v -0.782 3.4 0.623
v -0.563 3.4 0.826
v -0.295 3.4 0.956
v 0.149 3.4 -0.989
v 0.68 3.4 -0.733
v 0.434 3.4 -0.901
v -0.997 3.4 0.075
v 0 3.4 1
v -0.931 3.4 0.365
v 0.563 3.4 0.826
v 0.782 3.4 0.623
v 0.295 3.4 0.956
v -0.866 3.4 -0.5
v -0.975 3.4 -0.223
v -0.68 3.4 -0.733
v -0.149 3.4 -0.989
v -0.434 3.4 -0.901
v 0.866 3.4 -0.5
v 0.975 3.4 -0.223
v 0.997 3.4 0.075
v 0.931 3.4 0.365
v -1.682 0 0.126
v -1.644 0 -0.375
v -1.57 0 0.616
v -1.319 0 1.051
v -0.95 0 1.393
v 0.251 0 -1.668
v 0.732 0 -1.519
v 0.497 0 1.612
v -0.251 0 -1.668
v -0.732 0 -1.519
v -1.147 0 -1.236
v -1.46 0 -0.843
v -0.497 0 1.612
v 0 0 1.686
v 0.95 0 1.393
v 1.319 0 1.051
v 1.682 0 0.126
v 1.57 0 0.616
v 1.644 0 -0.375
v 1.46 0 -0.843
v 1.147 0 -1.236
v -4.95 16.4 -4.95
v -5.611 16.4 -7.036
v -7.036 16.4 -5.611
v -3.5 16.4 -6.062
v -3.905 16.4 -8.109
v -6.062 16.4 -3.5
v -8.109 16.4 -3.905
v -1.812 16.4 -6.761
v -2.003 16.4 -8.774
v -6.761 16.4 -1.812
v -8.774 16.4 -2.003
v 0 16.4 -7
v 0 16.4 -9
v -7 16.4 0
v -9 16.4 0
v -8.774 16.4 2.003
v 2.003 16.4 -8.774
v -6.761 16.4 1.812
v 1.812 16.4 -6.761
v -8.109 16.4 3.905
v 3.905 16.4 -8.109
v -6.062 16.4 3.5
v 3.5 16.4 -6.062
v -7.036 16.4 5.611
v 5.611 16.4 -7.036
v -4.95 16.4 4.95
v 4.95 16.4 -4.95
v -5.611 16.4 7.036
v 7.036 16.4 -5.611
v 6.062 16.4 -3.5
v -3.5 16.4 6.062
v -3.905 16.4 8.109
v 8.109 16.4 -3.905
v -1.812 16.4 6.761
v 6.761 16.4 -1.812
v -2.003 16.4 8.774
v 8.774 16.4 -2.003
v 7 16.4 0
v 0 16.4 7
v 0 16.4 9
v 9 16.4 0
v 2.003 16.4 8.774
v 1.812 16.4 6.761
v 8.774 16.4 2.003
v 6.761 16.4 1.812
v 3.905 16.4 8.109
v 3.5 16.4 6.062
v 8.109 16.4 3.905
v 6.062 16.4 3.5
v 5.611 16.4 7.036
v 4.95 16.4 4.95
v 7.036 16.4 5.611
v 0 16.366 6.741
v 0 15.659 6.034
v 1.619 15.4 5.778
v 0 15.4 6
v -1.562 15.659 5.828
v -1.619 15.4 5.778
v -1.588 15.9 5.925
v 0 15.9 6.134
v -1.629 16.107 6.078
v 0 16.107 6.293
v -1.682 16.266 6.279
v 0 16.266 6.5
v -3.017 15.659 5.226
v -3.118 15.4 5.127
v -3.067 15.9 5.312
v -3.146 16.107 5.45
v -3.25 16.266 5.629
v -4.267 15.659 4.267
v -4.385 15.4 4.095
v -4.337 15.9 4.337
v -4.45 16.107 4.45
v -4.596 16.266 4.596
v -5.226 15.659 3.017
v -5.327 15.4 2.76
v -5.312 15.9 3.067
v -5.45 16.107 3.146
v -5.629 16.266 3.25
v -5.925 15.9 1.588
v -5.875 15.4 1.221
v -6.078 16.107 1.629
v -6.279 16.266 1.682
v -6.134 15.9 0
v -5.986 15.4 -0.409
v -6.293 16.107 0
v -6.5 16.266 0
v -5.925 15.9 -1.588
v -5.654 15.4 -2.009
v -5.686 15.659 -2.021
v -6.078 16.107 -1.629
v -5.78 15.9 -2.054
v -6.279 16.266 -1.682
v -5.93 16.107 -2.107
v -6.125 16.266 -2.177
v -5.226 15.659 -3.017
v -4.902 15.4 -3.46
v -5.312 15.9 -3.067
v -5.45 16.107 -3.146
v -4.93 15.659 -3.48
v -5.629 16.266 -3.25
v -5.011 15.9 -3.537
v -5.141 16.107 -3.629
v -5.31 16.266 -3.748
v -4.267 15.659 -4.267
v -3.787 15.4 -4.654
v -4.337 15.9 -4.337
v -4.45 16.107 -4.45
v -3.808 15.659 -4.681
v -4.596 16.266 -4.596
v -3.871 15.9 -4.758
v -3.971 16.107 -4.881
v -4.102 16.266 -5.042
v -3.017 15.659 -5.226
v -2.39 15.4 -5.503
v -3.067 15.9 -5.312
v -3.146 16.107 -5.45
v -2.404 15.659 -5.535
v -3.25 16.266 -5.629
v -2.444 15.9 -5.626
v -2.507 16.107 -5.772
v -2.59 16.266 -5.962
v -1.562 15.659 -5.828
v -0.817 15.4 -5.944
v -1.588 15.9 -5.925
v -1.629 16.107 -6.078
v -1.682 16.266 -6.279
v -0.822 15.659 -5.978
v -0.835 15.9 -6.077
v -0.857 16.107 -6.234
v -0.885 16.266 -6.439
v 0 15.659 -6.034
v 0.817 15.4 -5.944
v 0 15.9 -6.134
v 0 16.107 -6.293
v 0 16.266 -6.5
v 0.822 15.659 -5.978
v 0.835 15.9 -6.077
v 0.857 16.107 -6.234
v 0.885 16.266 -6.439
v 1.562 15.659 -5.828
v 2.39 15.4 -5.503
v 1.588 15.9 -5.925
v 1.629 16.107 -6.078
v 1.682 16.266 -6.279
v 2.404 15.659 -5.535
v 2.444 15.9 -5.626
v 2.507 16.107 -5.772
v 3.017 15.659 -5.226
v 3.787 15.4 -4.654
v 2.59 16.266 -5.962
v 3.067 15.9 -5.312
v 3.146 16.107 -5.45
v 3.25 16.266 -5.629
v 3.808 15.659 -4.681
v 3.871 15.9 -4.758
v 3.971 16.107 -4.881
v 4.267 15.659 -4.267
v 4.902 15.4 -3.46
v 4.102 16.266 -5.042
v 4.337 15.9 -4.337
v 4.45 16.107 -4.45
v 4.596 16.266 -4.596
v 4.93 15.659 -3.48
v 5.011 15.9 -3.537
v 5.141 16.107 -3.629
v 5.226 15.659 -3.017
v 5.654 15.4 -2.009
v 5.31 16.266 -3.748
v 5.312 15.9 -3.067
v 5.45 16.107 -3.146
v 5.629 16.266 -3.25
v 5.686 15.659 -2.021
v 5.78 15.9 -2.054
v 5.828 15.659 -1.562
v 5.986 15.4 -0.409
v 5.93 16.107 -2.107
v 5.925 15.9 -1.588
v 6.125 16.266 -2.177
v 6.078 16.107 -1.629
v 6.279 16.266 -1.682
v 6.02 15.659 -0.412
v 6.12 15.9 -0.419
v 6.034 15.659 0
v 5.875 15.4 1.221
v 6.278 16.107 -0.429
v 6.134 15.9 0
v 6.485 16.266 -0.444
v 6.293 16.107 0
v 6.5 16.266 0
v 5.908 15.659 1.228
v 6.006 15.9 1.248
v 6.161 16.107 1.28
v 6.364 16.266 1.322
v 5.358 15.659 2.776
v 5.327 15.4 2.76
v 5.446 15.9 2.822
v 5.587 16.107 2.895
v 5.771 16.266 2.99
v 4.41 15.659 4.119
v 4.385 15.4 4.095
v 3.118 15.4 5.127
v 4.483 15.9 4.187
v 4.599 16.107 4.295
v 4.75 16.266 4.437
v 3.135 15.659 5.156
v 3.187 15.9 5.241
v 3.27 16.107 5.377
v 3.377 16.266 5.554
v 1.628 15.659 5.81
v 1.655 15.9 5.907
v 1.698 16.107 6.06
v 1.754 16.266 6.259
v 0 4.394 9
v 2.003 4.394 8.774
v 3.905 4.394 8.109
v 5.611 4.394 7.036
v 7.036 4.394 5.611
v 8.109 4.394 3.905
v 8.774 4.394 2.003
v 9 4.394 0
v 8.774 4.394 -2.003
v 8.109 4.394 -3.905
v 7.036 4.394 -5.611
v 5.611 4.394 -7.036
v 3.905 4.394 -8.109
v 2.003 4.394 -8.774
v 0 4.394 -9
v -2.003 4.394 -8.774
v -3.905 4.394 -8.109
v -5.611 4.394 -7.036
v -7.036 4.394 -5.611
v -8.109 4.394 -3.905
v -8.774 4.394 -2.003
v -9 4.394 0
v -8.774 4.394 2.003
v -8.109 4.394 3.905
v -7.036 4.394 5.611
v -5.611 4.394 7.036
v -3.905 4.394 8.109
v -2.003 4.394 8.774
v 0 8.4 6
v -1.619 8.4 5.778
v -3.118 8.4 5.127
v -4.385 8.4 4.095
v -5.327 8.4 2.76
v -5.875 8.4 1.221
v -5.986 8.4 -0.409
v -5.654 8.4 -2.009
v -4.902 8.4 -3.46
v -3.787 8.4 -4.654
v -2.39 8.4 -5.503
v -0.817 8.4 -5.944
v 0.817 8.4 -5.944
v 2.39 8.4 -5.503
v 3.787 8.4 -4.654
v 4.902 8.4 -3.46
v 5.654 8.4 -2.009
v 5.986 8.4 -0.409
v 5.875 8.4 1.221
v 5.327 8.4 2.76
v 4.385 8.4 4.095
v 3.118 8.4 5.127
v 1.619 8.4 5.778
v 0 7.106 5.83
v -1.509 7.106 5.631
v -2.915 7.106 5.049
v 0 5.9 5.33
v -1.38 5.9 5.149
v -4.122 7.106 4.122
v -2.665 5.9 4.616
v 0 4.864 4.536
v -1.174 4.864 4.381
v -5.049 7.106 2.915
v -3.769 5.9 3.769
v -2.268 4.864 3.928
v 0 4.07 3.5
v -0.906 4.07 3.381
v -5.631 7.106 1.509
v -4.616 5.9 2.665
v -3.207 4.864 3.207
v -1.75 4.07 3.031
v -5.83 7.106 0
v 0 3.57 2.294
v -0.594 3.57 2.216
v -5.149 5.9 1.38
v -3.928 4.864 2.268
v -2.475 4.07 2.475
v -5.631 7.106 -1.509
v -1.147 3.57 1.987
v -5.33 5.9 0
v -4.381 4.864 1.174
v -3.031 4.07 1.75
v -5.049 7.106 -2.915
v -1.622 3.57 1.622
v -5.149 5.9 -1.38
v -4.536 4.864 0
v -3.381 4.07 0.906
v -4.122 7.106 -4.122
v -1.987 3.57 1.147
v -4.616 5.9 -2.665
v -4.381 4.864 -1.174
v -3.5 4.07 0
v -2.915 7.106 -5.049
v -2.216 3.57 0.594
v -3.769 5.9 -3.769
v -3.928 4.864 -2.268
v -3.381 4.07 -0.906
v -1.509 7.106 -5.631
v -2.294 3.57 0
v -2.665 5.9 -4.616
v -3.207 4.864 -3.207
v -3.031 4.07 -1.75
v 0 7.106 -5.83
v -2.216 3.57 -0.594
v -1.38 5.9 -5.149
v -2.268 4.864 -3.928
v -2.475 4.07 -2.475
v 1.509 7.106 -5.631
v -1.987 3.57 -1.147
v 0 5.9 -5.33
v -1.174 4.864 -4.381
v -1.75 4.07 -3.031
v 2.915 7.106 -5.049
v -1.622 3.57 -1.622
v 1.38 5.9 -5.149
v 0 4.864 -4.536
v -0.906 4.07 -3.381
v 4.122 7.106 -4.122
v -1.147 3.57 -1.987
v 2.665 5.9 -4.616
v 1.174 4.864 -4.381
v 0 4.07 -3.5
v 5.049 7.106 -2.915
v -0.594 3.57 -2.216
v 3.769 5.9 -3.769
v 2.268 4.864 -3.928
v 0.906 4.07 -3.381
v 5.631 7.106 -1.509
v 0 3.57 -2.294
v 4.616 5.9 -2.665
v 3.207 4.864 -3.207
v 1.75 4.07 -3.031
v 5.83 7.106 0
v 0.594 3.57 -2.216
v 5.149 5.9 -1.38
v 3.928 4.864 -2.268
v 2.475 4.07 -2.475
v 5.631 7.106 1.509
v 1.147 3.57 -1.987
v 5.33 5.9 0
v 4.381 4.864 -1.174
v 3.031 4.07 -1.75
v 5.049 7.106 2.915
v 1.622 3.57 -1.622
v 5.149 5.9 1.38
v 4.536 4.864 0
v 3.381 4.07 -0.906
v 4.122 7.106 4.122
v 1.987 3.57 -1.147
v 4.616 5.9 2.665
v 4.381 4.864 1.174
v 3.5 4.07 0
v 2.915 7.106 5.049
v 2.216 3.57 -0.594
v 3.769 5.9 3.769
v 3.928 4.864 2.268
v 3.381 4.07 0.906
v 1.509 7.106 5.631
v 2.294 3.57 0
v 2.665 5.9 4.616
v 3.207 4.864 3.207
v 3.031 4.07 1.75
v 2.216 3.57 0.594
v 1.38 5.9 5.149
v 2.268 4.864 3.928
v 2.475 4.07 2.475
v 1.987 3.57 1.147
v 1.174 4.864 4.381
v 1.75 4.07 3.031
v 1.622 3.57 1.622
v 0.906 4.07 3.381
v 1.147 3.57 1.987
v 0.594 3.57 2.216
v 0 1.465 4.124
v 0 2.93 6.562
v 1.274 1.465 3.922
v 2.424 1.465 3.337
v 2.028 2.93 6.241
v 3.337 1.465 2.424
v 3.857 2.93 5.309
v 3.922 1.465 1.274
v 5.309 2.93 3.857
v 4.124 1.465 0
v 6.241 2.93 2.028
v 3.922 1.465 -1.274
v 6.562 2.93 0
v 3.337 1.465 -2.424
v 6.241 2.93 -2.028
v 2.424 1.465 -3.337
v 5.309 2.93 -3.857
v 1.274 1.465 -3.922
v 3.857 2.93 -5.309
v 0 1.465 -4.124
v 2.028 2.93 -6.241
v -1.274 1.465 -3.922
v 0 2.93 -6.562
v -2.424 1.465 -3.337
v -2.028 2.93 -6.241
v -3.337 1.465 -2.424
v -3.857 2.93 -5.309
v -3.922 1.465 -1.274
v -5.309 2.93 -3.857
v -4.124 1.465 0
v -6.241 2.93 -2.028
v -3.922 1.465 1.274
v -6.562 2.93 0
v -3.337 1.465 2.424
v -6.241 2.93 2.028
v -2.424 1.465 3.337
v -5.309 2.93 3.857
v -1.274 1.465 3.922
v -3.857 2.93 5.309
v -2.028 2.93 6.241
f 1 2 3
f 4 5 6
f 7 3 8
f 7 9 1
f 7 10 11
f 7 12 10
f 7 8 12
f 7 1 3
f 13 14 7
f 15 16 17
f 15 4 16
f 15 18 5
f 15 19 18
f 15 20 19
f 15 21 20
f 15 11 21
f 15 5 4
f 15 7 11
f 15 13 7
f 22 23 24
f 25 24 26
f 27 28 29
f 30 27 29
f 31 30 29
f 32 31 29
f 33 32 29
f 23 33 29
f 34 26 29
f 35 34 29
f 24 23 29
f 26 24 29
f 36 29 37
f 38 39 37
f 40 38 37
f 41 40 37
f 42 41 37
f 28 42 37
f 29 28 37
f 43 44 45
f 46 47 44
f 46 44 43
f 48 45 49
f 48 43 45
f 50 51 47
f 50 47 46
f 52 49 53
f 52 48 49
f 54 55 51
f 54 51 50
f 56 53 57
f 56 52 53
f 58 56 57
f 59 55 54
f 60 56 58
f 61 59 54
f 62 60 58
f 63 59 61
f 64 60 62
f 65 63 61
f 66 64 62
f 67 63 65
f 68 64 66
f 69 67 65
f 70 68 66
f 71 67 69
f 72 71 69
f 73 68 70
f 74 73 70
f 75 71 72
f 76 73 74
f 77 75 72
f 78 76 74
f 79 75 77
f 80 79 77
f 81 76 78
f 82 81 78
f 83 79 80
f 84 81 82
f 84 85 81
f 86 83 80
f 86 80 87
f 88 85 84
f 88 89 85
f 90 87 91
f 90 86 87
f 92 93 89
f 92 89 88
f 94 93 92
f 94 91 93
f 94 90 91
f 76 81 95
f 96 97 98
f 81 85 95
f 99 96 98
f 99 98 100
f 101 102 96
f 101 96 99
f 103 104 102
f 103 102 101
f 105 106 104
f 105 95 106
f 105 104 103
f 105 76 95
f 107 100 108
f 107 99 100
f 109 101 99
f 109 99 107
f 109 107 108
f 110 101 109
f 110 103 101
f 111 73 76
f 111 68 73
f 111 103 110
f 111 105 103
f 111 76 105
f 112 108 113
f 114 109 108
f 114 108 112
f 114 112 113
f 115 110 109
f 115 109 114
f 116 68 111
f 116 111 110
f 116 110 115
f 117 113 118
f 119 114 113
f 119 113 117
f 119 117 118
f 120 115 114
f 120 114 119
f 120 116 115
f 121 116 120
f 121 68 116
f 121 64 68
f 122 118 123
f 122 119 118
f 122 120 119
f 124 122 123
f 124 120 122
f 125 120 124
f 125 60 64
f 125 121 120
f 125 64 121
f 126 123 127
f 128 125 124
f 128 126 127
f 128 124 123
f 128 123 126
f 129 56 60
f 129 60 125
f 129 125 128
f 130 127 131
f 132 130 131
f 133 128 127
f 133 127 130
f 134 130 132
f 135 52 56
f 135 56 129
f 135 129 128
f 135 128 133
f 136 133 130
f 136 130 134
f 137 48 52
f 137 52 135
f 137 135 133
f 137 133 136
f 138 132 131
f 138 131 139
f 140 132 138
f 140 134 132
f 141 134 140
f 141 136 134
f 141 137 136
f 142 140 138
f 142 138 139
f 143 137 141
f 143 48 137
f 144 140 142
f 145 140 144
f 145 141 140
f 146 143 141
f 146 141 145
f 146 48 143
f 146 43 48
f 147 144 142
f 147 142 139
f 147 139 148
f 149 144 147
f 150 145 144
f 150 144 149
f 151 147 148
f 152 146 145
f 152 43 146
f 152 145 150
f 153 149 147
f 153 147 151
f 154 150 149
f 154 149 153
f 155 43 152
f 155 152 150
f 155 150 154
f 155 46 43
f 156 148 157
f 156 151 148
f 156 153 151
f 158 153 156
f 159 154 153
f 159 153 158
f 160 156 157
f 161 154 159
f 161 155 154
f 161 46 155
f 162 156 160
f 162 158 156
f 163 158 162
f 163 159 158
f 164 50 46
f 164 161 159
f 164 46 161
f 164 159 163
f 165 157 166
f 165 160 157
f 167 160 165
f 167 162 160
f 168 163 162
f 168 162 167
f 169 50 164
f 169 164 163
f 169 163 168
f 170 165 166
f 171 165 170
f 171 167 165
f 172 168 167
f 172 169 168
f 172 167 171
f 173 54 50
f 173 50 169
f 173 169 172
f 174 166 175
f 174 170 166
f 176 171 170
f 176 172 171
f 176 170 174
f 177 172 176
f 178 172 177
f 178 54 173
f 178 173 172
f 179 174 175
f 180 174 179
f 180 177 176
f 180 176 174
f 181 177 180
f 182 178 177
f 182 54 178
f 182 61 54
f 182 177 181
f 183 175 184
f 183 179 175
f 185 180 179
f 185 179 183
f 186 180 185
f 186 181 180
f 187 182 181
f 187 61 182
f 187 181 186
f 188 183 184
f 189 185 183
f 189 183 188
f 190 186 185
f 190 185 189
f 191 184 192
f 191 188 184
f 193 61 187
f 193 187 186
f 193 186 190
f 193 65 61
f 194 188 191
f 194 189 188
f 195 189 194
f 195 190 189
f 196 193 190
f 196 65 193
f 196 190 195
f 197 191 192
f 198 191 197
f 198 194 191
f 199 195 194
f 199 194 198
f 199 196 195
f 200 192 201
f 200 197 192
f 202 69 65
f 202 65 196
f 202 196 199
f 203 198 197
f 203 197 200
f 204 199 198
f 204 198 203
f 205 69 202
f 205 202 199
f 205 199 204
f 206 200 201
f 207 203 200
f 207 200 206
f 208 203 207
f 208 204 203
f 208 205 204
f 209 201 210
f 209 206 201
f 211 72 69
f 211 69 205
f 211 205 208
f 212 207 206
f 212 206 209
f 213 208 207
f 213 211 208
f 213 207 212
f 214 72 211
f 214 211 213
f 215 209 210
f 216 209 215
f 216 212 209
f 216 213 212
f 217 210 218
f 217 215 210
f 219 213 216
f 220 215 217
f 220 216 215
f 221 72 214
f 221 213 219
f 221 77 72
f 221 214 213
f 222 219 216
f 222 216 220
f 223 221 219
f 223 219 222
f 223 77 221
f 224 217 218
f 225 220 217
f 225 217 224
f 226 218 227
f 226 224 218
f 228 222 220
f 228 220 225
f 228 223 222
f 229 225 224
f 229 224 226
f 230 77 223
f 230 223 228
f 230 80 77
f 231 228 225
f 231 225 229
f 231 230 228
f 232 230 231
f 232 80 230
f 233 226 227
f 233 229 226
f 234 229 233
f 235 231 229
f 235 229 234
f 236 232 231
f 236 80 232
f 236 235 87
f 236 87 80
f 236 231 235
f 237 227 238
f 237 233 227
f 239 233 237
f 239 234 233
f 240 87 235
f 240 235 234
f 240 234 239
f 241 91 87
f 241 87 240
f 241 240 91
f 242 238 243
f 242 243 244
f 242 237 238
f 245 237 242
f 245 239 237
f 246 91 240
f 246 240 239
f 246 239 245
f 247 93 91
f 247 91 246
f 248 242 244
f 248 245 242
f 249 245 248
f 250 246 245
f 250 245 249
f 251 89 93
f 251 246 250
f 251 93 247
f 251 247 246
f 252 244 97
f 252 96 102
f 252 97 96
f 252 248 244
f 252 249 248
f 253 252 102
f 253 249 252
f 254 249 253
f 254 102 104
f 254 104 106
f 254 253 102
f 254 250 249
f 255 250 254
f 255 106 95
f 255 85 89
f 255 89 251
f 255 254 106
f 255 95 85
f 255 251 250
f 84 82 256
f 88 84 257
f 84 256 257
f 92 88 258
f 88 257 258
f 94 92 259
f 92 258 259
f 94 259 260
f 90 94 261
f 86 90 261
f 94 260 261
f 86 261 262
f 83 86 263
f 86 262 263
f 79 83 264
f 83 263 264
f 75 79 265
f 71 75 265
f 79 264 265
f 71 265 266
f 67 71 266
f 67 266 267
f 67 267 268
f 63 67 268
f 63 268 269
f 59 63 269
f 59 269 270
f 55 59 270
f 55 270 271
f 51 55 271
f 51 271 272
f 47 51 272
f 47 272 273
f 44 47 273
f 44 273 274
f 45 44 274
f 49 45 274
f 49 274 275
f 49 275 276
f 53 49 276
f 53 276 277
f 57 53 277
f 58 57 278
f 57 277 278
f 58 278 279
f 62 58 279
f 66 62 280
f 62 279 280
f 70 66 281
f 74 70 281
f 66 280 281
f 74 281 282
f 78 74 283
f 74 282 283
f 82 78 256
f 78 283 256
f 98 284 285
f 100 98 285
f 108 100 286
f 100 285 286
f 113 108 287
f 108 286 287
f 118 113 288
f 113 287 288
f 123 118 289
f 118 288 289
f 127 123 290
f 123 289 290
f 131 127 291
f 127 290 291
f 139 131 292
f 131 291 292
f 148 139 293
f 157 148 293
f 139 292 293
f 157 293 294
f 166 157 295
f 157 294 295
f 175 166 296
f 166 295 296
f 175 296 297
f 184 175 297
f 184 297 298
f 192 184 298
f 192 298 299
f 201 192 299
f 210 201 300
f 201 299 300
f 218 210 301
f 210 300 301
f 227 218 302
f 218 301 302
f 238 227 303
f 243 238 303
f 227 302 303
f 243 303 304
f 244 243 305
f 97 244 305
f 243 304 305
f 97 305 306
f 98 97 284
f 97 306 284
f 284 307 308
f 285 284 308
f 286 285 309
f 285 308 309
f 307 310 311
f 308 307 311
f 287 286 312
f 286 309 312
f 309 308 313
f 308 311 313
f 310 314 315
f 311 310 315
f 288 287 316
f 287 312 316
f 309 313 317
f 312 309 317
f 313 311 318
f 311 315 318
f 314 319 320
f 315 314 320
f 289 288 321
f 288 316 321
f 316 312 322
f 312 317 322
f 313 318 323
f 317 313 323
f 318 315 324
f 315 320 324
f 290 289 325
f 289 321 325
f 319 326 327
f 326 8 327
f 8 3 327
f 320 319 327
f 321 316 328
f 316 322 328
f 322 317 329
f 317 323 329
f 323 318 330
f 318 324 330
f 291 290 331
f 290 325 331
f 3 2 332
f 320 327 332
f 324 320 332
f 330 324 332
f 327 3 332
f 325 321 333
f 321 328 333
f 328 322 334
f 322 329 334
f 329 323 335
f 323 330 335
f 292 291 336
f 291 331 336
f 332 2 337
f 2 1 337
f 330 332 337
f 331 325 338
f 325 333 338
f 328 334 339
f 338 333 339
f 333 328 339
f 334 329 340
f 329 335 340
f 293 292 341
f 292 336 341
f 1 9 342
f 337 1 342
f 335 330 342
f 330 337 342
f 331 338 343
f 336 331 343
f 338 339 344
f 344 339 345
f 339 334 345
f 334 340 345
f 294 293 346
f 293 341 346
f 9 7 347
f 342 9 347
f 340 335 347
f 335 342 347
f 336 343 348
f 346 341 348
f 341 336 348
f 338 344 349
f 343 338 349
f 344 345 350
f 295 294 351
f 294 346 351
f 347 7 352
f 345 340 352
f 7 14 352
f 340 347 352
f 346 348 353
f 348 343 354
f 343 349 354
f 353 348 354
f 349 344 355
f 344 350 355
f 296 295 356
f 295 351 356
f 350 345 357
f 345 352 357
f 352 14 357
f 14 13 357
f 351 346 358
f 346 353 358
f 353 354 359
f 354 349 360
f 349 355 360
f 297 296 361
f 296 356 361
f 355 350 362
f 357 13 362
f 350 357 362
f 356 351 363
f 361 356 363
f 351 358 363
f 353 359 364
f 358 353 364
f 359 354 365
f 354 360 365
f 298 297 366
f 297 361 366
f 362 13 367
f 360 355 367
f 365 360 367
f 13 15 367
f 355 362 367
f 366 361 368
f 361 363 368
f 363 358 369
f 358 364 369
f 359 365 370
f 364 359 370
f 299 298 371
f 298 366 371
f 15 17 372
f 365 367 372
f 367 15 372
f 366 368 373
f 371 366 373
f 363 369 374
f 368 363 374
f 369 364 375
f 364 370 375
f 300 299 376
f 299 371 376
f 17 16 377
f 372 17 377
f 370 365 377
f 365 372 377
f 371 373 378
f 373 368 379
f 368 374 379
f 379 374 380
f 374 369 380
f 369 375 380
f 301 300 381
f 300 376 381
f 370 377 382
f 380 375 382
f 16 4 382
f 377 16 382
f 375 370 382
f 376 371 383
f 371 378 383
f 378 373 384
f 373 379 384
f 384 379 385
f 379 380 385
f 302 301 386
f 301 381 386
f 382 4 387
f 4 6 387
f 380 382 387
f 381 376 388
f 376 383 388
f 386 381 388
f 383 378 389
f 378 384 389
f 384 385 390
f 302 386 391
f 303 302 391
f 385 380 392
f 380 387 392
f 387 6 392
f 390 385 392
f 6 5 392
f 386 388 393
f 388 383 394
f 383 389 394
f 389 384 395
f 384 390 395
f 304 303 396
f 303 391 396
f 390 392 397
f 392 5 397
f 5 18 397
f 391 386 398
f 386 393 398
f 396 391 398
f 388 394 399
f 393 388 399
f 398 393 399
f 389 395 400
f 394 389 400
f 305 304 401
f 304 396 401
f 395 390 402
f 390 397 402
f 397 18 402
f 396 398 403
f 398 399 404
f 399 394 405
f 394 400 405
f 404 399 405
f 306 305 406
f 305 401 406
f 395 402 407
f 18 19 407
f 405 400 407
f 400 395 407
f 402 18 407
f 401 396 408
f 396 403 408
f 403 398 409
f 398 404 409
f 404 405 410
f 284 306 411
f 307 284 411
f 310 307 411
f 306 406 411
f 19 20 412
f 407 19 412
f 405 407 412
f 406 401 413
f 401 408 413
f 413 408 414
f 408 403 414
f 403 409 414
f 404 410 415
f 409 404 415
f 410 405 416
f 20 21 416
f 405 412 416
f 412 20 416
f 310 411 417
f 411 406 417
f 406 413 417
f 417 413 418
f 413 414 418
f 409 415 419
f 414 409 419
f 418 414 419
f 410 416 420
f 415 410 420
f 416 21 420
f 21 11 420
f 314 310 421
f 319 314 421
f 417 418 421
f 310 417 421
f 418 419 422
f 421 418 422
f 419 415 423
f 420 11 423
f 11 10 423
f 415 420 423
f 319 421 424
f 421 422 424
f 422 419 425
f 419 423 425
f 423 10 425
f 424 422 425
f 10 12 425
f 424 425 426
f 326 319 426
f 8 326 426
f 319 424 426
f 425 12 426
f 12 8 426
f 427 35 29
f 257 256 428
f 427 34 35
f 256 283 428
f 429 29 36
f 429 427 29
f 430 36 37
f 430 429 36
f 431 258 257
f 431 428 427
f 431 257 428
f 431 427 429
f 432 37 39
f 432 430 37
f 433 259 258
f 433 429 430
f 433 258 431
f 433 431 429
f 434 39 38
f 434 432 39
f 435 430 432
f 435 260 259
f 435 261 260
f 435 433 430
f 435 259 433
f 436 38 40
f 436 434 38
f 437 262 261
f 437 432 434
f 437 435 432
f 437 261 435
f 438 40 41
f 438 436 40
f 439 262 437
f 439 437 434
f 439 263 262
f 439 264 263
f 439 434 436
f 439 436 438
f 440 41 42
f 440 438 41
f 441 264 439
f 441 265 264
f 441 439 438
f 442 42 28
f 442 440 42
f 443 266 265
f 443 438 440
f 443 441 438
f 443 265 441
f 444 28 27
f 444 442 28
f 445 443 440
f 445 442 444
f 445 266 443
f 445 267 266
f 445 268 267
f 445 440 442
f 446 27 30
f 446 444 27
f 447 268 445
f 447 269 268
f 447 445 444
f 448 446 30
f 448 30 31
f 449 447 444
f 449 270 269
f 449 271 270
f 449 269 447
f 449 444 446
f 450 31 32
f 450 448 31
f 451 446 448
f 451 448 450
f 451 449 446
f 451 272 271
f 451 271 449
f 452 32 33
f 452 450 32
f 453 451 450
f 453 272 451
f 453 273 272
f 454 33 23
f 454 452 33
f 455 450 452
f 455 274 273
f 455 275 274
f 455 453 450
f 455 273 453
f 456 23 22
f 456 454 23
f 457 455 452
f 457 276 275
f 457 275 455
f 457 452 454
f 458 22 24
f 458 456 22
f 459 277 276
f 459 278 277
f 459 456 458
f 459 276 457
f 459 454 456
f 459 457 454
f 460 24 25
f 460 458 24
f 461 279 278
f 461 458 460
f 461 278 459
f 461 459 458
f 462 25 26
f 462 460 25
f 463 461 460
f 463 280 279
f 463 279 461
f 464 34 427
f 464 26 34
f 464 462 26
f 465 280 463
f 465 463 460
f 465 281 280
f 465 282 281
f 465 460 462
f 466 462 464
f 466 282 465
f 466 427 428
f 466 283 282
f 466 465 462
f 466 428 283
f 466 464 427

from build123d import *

# Parameters (mm, degrees)
SKETCH1_R           = 9
BOSS_EXTRUDE1_DEPTH = 16.4
SKETCH2_W           = 6
SKETCH2_H           = 13
FILLET1_R           = 5
FILLET2_R           = 1


with BuildPart() as part:
    # Sketch1 → Boss-Extrude1 (new body)
    with BuildSketch(Plane(origin=(0, 0, 0), x_dir=(1, 0, 0), z_dir=(0, 1, 0))):
        with Locations(Location((0, 0, 0), (0, 0, 270))):
            Circle(SKETCH1_R)
    extrude(amount=BOSS_EXTRUDE1_DEPTH)

    # Sketch2 → Ø12.0mm Dowel Hole1 (revolve, cut)
    with BuildSketch(Plane(origin=(0, 16.4, 0), x_dir=(0, 0, 1), z_dir=(1, 0, 0))):
        with Locations((3, 6.5)):
            Rectangle(SKETCH2_W, SKETCH2_H)
    revolve(axis=Axis((0, 19.332571692, 0), (0, -1, 0)), mode=Mode.SUBTRACT)

    # Sketch3 → Cut-Revolve1 (revolve, cut)
    with BuildSketch(Plane(origin=(0, 0, 0), x_dir=(0, 0, -1), z_dir=(1, 0, 0))):
        Polygon((-9, 0), (-1.686427948, 0), (-9, 4.39443743), align=None)
    revolve(axis=Axis((0, 0, 0), (0, 1, 0)), mode=Mode.SUBTRACT)

    # Fillet1
    fillet1_edges = [part.edges().sort_by_distance(p)[0] for p in [
        (0, 3.4, -6),
    ]]
    fillet(fillet1_edges, radius=FILLET1_R)

    # Fillet2
    fillet2_edges = [part.edges().sort_by_distance(p)[0] for p in [
        (0, 16.4, -6),
    ]]
    fillet(fillet2_edges, radius=FILLET2_R)


solid = part.part
